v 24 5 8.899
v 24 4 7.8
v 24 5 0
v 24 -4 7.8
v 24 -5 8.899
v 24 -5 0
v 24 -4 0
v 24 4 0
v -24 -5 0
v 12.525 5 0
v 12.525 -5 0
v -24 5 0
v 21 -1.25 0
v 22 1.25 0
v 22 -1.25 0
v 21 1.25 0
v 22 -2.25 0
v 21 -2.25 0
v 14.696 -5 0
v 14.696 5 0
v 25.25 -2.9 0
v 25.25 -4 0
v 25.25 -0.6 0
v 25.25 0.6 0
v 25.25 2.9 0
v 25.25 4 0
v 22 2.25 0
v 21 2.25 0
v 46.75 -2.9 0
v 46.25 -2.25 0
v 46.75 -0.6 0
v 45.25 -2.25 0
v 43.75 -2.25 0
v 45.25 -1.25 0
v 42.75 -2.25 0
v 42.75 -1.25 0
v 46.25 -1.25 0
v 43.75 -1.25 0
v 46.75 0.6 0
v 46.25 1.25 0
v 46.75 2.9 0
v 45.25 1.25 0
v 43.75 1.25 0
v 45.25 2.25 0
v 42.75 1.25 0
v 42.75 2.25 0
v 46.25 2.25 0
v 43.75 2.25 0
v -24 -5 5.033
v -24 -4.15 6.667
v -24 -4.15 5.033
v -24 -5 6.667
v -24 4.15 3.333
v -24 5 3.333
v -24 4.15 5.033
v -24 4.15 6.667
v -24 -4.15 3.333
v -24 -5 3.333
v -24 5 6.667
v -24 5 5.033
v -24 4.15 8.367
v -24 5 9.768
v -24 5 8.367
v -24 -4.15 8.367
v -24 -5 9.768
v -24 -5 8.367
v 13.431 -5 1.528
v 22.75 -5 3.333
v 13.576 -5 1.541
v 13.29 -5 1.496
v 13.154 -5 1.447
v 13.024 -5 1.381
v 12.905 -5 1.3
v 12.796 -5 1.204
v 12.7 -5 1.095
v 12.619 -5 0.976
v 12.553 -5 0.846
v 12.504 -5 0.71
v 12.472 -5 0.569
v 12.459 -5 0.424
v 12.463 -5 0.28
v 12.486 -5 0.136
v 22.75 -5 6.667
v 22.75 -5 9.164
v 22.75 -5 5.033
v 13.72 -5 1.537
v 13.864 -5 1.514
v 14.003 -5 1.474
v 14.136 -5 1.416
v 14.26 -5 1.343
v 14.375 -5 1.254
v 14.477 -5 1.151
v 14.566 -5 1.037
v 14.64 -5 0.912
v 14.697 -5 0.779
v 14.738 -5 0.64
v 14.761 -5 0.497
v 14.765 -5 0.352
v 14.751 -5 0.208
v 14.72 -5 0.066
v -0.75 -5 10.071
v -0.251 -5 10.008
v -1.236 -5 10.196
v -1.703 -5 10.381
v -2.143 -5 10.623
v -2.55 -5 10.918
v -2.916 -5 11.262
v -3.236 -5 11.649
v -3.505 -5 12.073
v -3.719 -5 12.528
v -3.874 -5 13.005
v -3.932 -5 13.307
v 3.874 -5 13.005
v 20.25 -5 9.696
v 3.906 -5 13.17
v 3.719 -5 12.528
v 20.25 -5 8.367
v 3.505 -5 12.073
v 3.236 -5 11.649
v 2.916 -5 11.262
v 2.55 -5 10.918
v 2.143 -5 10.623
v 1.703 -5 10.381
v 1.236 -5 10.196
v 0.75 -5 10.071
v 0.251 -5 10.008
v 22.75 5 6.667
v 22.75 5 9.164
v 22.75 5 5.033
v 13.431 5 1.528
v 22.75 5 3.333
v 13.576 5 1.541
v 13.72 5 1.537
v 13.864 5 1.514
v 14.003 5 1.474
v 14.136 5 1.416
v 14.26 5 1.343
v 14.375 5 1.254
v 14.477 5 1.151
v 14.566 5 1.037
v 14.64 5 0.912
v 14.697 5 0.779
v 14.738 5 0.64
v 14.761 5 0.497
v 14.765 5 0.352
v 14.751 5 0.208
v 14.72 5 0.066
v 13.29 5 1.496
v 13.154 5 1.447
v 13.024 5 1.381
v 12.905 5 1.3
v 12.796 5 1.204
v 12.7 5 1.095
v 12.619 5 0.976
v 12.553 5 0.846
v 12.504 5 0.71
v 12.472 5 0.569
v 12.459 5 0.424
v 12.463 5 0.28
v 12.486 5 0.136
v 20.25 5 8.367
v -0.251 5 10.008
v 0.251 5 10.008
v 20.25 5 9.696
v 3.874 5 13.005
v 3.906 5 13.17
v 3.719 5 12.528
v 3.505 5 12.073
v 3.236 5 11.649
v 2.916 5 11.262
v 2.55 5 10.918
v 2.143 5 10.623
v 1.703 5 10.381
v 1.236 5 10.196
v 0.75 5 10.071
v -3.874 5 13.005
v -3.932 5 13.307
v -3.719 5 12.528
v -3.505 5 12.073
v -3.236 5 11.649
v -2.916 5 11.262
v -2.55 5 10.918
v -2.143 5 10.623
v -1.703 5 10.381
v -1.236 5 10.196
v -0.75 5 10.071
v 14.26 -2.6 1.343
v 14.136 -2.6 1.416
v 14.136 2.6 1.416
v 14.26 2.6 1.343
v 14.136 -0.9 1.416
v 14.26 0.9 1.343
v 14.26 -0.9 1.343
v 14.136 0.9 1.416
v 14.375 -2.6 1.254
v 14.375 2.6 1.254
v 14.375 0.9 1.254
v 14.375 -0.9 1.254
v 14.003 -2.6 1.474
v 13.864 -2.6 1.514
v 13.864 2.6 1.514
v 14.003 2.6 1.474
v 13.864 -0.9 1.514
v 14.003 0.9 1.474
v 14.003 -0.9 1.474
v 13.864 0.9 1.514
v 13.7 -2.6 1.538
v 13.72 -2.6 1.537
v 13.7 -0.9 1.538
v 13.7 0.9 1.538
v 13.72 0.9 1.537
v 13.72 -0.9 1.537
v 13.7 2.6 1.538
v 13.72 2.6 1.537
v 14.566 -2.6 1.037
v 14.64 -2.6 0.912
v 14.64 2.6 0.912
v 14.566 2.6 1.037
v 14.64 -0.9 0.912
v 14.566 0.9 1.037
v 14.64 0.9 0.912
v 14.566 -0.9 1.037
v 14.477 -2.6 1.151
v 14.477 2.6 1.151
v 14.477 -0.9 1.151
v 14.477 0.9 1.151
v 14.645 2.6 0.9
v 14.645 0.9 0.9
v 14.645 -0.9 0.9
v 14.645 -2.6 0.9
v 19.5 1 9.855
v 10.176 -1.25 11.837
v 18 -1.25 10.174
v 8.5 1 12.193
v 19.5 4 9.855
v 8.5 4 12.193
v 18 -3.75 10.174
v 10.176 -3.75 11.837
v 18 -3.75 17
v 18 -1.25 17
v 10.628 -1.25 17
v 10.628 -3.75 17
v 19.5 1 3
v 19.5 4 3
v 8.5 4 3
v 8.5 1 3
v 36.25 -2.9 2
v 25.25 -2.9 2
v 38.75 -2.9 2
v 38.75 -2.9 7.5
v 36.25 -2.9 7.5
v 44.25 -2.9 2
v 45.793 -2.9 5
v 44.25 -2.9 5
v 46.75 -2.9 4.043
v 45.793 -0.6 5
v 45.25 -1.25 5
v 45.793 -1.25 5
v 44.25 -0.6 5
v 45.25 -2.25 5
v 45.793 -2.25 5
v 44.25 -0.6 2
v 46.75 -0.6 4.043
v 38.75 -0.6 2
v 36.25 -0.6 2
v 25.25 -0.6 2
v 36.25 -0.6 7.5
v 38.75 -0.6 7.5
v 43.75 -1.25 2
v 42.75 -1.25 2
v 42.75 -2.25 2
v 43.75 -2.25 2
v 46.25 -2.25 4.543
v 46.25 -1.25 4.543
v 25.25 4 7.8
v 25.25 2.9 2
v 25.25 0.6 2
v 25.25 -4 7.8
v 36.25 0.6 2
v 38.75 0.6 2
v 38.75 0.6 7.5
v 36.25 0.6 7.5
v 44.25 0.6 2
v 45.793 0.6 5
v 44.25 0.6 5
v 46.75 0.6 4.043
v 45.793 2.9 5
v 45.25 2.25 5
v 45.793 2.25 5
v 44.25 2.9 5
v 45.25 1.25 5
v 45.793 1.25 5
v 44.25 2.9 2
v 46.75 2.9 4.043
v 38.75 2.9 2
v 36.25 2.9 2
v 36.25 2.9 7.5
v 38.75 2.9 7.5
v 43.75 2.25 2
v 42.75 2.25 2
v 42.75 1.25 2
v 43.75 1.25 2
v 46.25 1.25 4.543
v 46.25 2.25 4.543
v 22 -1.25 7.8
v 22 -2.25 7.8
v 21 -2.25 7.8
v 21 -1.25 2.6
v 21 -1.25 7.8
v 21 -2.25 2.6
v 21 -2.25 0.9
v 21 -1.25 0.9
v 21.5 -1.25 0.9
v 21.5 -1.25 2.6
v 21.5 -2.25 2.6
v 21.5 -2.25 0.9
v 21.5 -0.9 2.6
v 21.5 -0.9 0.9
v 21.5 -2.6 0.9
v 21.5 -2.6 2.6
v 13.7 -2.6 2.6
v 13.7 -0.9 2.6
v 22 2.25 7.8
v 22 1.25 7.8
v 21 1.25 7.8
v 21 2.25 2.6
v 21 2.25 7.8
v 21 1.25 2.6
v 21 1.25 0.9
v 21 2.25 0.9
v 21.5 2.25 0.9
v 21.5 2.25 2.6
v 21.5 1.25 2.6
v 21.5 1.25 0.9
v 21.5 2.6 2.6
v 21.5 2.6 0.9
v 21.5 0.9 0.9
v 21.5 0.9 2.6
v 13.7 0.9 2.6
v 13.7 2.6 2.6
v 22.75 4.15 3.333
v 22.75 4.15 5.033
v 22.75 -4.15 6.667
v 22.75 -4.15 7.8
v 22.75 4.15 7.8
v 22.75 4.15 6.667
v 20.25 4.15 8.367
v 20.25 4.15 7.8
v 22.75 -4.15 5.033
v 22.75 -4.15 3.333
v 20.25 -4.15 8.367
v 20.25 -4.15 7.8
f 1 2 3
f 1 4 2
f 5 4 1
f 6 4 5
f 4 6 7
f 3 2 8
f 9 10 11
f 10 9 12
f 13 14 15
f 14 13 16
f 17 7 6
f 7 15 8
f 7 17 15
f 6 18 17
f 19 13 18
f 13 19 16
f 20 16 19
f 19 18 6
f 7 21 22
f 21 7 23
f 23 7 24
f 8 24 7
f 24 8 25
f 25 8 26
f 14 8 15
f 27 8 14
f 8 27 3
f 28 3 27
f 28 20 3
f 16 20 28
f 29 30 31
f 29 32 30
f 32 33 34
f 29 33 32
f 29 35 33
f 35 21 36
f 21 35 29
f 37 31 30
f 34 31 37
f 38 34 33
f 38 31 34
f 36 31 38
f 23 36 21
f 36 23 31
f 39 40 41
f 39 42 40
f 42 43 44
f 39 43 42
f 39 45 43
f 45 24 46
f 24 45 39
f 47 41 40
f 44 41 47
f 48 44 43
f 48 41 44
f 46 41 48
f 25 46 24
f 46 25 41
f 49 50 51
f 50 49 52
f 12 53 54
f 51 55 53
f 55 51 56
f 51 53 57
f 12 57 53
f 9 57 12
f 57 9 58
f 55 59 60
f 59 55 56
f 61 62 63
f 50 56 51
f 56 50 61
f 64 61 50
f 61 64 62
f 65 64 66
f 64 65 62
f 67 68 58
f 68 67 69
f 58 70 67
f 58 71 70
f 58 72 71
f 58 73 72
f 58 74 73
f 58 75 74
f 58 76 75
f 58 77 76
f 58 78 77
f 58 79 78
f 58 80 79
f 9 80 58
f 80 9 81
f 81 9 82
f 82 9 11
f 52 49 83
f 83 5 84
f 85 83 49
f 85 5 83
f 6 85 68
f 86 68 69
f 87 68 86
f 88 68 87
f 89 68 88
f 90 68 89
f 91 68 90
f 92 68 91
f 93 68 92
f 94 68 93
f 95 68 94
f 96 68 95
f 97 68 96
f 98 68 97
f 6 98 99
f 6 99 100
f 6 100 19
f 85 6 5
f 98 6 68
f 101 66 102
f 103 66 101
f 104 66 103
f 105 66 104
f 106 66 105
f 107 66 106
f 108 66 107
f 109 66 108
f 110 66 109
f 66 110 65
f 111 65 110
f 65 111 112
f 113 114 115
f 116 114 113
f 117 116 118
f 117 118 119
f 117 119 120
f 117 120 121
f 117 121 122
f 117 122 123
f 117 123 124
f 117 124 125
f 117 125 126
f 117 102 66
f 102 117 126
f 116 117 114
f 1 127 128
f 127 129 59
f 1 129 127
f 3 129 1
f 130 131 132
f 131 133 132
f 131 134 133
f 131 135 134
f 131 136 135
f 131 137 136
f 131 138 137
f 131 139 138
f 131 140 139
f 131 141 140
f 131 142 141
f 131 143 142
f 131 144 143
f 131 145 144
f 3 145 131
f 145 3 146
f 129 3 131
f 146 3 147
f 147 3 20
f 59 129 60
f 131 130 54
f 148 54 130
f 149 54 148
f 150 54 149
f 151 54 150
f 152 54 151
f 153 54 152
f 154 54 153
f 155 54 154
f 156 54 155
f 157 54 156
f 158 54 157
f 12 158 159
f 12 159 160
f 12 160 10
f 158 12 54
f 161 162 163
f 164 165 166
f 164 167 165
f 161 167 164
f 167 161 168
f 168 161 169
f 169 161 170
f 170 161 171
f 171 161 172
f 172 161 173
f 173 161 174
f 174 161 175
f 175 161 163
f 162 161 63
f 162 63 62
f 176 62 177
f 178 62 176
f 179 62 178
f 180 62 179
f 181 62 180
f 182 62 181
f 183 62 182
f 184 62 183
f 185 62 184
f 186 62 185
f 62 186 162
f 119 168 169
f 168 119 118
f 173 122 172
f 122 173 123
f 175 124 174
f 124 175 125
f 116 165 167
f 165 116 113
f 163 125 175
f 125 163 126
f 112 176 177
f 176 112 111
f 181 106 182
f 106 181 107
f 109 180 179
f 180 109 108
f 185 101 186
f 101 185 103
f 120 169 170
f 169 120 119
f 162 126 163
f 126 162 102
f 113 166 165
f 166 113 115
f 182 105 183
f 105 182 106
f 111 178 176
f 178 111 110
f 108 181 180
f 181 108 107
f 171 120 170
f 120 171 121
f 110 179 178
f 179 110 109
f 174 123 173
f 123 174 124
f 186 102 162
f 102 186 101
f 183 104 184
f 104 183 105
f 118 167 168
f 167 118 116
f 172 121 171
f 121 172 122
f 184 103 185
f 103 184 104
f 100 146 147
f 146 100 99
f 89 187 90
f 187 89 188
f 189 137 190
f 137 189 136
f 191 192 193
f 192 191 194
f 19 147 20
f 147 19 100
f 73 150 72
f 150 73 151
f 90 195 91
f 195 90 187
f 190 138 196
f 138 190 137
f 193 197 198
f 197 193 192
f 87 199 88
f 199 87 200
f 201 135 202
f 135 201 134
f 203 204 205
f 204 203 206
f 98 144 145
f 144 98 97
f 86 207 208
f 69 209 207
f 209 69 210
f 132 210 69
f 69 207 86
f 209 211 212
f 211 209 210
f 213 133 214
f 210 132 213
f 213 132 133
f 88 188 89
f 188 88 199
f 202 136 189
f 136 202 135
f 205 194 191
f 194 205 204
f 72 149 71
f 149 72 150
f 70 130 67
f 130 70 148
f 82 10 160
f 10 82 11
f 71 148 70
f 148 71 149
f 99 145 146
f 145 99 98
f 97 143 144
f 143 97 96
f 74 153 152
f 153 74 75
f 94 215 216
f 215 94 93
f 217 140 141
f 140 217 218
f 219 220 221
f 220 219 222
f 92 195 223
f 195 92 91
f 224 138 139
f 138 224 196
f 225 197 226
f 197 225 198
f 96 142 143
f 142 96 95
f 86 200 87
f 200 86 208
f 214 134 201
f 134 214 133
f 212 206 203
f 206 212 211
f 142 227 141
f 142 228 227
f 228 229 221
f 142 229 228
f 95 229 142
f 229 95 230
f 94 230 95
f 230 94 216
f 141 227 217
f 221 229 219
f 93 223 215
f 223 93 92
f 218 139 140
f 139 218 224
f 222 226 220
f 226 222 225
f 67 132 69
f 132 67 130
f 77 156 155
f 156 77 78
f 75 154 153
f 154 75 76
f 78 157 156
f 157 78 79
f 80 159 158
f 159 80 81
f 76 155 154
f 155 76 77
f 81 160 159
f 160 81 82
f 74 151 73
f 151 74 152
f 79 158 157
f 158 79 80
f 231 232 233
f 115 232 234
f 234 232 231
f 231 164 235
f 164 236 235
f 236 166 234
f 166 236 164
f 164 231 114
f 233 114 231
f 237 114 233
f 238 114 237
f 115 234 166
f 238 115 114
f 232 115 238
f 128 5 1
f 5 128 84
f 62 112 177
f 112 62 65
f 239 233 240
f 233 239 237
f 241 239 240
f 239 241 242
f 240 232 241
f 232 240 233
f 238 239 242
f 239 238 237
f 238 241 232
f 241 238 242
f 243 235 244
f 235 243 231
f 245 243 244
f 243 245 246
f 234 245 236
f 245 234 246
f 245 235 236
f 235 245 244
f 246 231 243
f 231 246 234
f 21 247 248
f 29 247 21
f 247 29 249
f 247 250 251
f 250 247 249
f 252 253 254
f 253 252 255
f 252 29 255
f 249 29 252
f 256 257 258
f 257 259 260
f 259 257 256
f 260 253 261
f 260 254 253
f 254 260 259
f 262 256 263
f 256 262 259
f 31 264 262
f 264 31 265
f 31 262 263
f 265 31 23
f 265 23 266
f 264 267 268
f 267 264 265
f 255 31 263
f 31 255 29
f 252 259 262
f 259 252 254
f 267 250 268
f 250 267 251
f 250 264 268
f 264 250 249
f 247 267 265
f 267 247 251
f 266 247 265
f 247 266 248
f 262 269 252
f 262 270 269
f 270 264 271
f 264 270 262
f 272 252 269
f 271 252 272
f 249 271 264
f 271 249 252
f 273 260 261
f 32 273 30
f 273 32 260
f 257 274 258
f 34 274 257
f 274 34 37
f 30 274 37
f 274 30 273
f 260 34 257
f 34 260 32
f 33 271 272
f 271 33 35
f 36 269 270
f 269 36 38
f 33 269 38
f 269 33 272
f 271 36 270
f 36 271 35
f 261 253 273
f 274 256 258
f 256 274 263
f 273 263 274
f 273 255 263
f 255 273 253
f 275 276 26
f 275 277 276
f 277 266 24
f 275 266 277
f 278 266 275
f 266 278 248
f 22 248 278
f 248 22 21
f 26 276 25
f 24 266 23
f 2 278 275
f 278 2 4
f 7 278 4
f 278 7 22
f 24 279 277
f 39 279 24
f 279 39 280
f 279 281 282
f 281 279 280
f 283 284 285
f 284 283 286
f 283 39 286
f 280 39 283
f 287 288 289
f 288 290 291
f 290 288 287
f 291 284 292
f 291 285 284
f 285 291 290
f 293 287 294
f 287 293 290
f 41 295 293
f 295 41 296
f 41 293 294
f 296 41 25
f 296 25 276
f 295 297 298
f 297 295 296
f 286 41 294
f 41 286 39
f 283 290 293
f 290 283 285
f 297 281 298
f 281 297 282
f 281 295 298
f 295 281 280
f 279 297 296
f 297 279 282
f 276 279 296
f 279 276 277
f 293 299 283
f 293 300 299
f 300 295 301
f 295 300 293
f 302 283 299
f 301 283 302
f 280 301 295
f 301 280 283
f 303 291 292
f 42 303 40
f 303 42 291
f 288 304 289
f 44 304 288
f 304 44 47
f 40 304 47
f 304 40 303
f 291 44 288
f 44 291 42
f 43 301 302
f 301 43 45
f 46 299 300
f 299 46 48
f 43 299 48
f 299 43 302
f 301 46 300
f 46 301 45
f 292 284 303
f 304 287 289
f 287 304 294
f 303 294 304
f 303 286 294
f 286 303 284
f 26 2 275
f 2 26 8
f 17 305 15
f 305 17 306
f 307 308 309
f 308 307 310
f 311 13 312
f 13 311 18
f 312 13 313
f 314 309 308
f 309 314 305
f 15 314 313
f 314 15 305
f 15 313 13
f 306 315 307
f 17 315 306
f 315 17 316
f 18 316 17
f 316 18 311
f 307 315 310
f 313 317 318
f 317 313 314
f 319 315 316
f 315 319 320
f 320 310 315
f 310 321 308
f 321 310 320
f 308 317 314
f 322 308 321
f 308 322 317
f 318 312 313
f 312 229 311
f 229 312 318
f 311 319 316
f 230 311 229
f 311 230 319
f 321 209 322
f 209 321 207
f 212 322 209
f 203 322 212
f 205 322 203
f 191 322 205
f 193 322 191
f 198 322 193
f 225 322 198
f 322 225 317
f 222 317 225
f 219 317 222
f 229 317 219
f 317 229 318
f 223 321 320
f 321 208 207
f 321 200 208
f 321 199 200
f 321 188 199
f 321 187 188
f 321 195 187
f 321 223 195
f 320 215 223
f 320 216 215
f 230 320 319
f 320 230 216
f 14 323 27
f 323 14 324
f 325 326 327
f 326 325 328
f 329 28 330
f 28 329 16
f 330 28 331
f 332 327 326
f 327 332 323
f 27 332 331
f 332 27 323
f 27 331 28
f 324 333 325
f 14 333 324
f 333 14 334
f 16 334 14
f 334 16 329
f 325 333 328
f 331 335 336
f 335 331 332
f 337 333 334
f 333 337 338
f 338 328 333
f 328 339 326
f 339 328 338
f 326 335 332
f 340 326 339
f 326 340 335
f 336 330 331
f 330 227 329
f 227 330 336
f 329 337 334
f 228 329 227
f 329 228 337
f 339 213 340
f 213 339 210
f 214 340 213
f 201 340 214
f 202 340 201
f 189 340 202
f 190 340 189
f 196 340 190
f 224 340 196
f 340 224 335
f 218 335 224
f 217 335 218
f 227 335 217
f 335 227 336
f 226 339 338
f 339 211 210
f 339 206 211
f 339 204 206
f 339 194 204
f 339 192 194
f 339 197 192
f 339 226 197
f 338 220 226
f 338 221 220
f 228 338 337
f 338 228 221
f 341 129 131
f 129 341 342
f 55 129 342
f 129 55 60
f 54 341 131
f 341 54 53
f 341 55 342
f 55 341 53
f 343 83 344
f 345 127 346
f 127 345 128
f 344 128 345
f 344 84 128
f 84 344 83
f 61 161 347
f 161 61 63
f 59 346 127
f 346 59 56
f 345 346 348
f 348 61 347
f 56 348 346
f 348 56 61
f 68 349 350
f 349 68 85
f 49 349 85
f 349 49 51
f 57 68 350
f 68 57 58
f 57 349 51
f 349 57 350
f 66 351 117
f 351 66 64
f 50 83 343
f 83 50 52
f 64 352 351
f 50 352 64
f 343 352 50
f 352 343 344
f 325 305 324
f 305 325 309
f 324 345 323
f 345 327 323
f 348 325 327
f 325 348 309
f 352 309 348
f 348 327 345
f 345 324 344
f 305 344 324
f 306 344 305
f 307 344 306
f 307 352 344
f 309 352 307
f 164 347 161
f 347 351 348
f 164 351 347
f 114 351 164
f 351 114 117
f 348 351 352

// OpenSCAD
$fn=8;

ts=2.5; // толщина стенки
tp=1;//диаметр жилы
tpr=1.7;//диаметр провода
trb=[2,tp,3];//внешний, внутренний высота
knt=[20,11, 7.5, 7.8];//высота до центра, толщина, высота стопора

dkn=2.5;//длина контактной площадки
shp=2.0;//высота шипа
do=3.8;
step=3.5;//шаг контактов
lin=[step-1.2,knt.x+trb.x,2];//ширина, длина, толщина
kk=2;//количество контактов
hhr=5+0.5;//высота верхней части раъема 0.5 это тлщина провода
//прищепка
prk=[8,10,1.5,24,10];//диаметр опоры, ширина,диаметр проволоки, длина плеча,высота половины


alll();
//alll_0();
module alll(){
    difference(){
        union(){
            prih();
            translate([0, -step*(kk-1)/2, 0]) {
                for(a=[0:1:kk-1]){
                    translate([0,a*step,0]){
                        translate([lin.y+prk[3],0,0])rotate([0,0,-90])pin_lin();
                        translate([prk[3],0,knt[3]/2])cube([ts,step+1,knt[3]],true);
                        translate([prk[3]-knt[3]/2,0,ts/2])cube([knt[3],step+1,ts],true);
                    }
                }
            }
        }
        for(a=[0:1:kk-1]){
            translate([0,a*step,0]){
                translate([prk[3]-ts,-step*(kk-1)/2,ts])cube([tp,tp,ts*13],true);
                translate([prk[3]-ts-knt[3]/2,-step*(kk-1)/2,ts-tpr/2+0.1])cube([knt[3],tpr,tpr],true);
            }
        }
        translate([prk[3]-ts,0,knt[3]+ts*3/2])cube([ts,prk.y*2,ts*3],true);
        translate([-prk[3]*2+prk[3]-ts/2,0,0]){
            translate([0,prk.y/2,tpr/2+prk[4]/3])cube([prk[3]*4,tpr,tpr],true);
            translate([0,prk.y/2,tpr/2+2*prk[4]/3])cube([prk[3]*4,tpr,tpr],true);
            translate([0,-prk.y/2,tpr/2+prk[4]/3])cube([prk[3]*4,tpr,tpr],true);
            translate([0,-prk.y/2,tpr/2+2*prk[4]/3])cube([prk[3]*4,tpr,tpr],true);
        }
        
    }
}
module alll_0(){
    difference(){
        union(){
            prih();
            translate([0, -step*(kk-1)/2, 0]) {
                for(a=[0:1:kk-1]){
                    translate([0,a*step,0]){
                        translate([lin.y+prk[3],0,0])rotate([0,0,-90])pin_lin_0();
                        translate([prk[3],0,knt[3]/2])cube([ts,step+1,knt[3]],true);
                        translate([prk[3]-knt[3]/2,0,ts/2])cube([knt[3],step+1,ts],true);
                    }
                }
            }
        }
        //for(a=[0:1:kk-1]){
           // translate([0,a*step,0]){
               // translate([prk[3]-ts,-step*(kk-1)/2,ts])cube([tp,tp,ts*13],true);
               // translate([prk[3]-ts-knt[3]/2,-step*(kk-1)/2,ts-tpr/2+0.1])cube([knt[3],tpr,tpr],true);
           // }
        //}
        //translate([prk[3]-ts,0,knt[3]+ts*3/2])cube([ts,prk.y*2,ts*3],true);
        //translate([-prk[3]*2+prk[3]-ts/2,0,0]){
          //  translate([0,step+0.1,tpr/2+prk[4]/3])cube([prk[3]*4,tpr,tpr],true);
          //  translate([0,step+0.1,tpr/2+2*prk[4]/3])cube([prk[3]*4,tpr,tpr],true);
          //  translate([0,-step+0.1,tpr/2+prk[4]/3])cube([prk[3]*4,tpr,tpr],true);
          //  translate([0,-step+0.1,tpr/2+2*prk[4]/3])cube([prk[3]*4,tpr,tpr],true);
       // }
        
    }
}

module prih(){
    $fn=50;
    difference(){
        union(){
            translate([0, 0, (prk[4]+prk[0]/2)])rotate([180,0,0])difference(){
                translate([0, 0, (prk[4]+prk[0]/2)/2]) cube([prk[3]*2,prk[1],prk[4]+prk[0]/2],true);
                translate([0, -prk[1]/2-0.5,0])rotate([-90,0,0])cylinder(prk[1]+1,prk[0]/2,prk[0]/2);
                rotate([0,-45,0])translate([prk[3]-prk[0]/2-prk[2]/2, -prk[1]/2-0.5,0])rotate([-90,0,0])cylinder(prk[1]+1,prk[2]/1.3,prk[2]/1.3);
                rotate([0,-12,0])translate([0, 0, -(prk[4]+prk[0]/2)/2]) cube([prk[3]*4,prk[1]*2,prk[4]+prk[0]/2],true);
                rotate([0,10,0])translate([0, 0, -(prk[4]+prk[0]/2)/2]) cube([prk[3]*4,prk[1]*2,prk[4]+prk[0]/2],true);
            }
            difference(){
                translate([prk[3]-prk[1], -2*ts/2, prk[4]]) cube([prk[1]-2,ts,prk[4]*1.4],true);
                translate([prk[3]-prk[1]-(prk[1]-2), -2*ts/2, prk[4]]) rotate([0,5,0])cube([prk[1]-2,ts*2,prk[4]*2],true);
            }
        }
        translate([(prk[3]-prk[1]), 2*ts/2, prk[4]]) cube([prk[1]+1,ts+0.5,prk[4]*1.4],true);
    }
    
}

//all_2();
module all_2(){
    difference(){
        union(){
            for(a=[0:1:kk-1]){
                translate([0,0,a*step])pin2();
            }
            for(a=[0:1:kk-1]){
                translate([knt[3]/2,0,a*step+step/2])ship();
            }
            hh=step*kk;
            translate([knt.y+ts/2, 0, hh/2]) cube([ts,knt.x*2,hh],true);
            translate([knt.y/2, -ts/2, hh/2]) cube([knt.y+ts+lin.z,ts,hh],true);
        }
        for(a=[0:1:kk-1]){
            translate([0,0,a*step])pin3();
        }
        for(a=[0:1:kk-1]){
            translate([0,0,a*step])pin4();
        }
    }
}

module ship(){
    intersection(){
        rotate([-90,0,0])cylinder(shp,do/2,do/2);
        cube([ts,do*4,8],true);
    }
}


module pin4(){
    translate([knt.x/2,-ts-0.1,step/2])cube([knt.x*2,tp,tp],true);;
}

module pin3(){
    translate([knt.y+ts,-knt.x/2-ts,step/2])cube([tpr,knt.x,tpr],true);;
}


module pin2(){
    //translate([-lin.z,knt.x,step/2])rotate([0,90,0])pin();
    translate([-lin.z,knt.x,step/2])rotate([0,90,0])pin_lin();
}

module pin1(){
    translate([0,0,lin.z])rotate([0,180,0])pin();
}

module pin(){
    difference(){
        union(){
            cylinder(trb.z+lin.z,trb.x/2,trb.x/2);
            translate([0, trb.x/2-lin.y/2,lin.z/2]) cube(lin,true);
        }
        translate([0,0,-0.1])cylinder(trb.z*2,trb.y/2,trb.y/2);
        translate([0,-(trb.x/2+trb.y),-0.1])cylinder(trb.z*2,trb.y/2,trb.y/2);
        translate([0, 0,trb.z+lin.z+trb.x/4]) rotate([-45,0,0])cube([trb.x*2,trb.x*2,trb.x/2],true);
    }
}

//pin_lin();
module pin_lin(){
    difference(){
        union(){
            //cylinder(trb.z+lin.z,trb.x/2,trb.x/2);
            translate([0, -trb.z/2+trb.y,(trb.z+lin.z)/2]) cube([lin.x,dkn,trb.z+lin.z],true);
            translate([0, -trb.z/2+trb.y-dkn/2-ts/2-hhr,(trb.z+lin.z+ts)/2]) cube([lin.x,ts,trb.z+lin.z+ts],true);
            translate([0, trb.x/2-lin.y/2-0.5,lin.z/2]) cube(lin,true);
        }
        //translate([0,-0.25,-0.1])cylinder(trb.z*2,trb.y/2,trb.y/2);
        translate([0,-0.25,trb.z-0.1])cube([trb.y,trb.y,trb.z*2],true);
        translate([0,-trb.z+0.25,trb.z-0.1])cube([trb.y,trb.y,trb.z*2],true);
        translate([0, 0,trb.z+lin.z+trb.x/4]) rotate([-45,0,0])cube([trb.x*2,trb.x*3,trb.x/2],true);
    }
}
module pin_lin_0(){
    difference(){
        union(){
            //cylinder(trb.z+lin.z,trb.x/2,trb.x/2);
            //translate([0, -trb.z/2+trb.y,(trb.z+lin.z)/2]) cube([lin.x,dkn,trb.z+lin.z],true);
           // translate([0, -trb.z/2+trb.y-dkn/2-ts/2-hhr,(trb.z+lin.z+ts)/2]) cube([lin.x,ts,trb.z+lin.z+ts],true);
            translate([0, trb.x/2-lin.y/2-0.5,lin.z]) cube([lin.x, lin.y, lin.z*2],true);
        }
        //translate([0,-0.25,-0.1])cylinder(trb.z*2,trb.y/2,trb.y/2);
        //translate([0,-0.25,trb.z-0.1])cube([trb.y,trb.y,trb.z*2],true);
        //translate([0,-trb.z+0.25,trb.z-0.1])cube([trb.y,trb.y,trb.z*2],true);
       // translate([0, 0,trb.z+lin.z+trb.x/4]) rotate([-45,0,0])cube([trb.x*2,trb.x*3,trb.x/2],true);
    }
}
module pin_s(){
    difference(){
        union(){
            cylinder(trb.z+lin.z-trb.x/2,trb.x/2,trb.x/2);
            translate([0, 0,trb.z+lin.z-trb.x/2])sphere(r=trb.x/2);
            translate([0, trb.x/2-lin.y/2,lin.z/2]) cube(lin,true);
        }
        translate([0,0,-0.1])cylinder(trb.z*2,trb.y/2,trb.y/2);
        translate([0,-(trb.x/2+trb.y),-0.1])cylinder(trb.z*2,trb.y/2,trb.y/2);
    }
}
